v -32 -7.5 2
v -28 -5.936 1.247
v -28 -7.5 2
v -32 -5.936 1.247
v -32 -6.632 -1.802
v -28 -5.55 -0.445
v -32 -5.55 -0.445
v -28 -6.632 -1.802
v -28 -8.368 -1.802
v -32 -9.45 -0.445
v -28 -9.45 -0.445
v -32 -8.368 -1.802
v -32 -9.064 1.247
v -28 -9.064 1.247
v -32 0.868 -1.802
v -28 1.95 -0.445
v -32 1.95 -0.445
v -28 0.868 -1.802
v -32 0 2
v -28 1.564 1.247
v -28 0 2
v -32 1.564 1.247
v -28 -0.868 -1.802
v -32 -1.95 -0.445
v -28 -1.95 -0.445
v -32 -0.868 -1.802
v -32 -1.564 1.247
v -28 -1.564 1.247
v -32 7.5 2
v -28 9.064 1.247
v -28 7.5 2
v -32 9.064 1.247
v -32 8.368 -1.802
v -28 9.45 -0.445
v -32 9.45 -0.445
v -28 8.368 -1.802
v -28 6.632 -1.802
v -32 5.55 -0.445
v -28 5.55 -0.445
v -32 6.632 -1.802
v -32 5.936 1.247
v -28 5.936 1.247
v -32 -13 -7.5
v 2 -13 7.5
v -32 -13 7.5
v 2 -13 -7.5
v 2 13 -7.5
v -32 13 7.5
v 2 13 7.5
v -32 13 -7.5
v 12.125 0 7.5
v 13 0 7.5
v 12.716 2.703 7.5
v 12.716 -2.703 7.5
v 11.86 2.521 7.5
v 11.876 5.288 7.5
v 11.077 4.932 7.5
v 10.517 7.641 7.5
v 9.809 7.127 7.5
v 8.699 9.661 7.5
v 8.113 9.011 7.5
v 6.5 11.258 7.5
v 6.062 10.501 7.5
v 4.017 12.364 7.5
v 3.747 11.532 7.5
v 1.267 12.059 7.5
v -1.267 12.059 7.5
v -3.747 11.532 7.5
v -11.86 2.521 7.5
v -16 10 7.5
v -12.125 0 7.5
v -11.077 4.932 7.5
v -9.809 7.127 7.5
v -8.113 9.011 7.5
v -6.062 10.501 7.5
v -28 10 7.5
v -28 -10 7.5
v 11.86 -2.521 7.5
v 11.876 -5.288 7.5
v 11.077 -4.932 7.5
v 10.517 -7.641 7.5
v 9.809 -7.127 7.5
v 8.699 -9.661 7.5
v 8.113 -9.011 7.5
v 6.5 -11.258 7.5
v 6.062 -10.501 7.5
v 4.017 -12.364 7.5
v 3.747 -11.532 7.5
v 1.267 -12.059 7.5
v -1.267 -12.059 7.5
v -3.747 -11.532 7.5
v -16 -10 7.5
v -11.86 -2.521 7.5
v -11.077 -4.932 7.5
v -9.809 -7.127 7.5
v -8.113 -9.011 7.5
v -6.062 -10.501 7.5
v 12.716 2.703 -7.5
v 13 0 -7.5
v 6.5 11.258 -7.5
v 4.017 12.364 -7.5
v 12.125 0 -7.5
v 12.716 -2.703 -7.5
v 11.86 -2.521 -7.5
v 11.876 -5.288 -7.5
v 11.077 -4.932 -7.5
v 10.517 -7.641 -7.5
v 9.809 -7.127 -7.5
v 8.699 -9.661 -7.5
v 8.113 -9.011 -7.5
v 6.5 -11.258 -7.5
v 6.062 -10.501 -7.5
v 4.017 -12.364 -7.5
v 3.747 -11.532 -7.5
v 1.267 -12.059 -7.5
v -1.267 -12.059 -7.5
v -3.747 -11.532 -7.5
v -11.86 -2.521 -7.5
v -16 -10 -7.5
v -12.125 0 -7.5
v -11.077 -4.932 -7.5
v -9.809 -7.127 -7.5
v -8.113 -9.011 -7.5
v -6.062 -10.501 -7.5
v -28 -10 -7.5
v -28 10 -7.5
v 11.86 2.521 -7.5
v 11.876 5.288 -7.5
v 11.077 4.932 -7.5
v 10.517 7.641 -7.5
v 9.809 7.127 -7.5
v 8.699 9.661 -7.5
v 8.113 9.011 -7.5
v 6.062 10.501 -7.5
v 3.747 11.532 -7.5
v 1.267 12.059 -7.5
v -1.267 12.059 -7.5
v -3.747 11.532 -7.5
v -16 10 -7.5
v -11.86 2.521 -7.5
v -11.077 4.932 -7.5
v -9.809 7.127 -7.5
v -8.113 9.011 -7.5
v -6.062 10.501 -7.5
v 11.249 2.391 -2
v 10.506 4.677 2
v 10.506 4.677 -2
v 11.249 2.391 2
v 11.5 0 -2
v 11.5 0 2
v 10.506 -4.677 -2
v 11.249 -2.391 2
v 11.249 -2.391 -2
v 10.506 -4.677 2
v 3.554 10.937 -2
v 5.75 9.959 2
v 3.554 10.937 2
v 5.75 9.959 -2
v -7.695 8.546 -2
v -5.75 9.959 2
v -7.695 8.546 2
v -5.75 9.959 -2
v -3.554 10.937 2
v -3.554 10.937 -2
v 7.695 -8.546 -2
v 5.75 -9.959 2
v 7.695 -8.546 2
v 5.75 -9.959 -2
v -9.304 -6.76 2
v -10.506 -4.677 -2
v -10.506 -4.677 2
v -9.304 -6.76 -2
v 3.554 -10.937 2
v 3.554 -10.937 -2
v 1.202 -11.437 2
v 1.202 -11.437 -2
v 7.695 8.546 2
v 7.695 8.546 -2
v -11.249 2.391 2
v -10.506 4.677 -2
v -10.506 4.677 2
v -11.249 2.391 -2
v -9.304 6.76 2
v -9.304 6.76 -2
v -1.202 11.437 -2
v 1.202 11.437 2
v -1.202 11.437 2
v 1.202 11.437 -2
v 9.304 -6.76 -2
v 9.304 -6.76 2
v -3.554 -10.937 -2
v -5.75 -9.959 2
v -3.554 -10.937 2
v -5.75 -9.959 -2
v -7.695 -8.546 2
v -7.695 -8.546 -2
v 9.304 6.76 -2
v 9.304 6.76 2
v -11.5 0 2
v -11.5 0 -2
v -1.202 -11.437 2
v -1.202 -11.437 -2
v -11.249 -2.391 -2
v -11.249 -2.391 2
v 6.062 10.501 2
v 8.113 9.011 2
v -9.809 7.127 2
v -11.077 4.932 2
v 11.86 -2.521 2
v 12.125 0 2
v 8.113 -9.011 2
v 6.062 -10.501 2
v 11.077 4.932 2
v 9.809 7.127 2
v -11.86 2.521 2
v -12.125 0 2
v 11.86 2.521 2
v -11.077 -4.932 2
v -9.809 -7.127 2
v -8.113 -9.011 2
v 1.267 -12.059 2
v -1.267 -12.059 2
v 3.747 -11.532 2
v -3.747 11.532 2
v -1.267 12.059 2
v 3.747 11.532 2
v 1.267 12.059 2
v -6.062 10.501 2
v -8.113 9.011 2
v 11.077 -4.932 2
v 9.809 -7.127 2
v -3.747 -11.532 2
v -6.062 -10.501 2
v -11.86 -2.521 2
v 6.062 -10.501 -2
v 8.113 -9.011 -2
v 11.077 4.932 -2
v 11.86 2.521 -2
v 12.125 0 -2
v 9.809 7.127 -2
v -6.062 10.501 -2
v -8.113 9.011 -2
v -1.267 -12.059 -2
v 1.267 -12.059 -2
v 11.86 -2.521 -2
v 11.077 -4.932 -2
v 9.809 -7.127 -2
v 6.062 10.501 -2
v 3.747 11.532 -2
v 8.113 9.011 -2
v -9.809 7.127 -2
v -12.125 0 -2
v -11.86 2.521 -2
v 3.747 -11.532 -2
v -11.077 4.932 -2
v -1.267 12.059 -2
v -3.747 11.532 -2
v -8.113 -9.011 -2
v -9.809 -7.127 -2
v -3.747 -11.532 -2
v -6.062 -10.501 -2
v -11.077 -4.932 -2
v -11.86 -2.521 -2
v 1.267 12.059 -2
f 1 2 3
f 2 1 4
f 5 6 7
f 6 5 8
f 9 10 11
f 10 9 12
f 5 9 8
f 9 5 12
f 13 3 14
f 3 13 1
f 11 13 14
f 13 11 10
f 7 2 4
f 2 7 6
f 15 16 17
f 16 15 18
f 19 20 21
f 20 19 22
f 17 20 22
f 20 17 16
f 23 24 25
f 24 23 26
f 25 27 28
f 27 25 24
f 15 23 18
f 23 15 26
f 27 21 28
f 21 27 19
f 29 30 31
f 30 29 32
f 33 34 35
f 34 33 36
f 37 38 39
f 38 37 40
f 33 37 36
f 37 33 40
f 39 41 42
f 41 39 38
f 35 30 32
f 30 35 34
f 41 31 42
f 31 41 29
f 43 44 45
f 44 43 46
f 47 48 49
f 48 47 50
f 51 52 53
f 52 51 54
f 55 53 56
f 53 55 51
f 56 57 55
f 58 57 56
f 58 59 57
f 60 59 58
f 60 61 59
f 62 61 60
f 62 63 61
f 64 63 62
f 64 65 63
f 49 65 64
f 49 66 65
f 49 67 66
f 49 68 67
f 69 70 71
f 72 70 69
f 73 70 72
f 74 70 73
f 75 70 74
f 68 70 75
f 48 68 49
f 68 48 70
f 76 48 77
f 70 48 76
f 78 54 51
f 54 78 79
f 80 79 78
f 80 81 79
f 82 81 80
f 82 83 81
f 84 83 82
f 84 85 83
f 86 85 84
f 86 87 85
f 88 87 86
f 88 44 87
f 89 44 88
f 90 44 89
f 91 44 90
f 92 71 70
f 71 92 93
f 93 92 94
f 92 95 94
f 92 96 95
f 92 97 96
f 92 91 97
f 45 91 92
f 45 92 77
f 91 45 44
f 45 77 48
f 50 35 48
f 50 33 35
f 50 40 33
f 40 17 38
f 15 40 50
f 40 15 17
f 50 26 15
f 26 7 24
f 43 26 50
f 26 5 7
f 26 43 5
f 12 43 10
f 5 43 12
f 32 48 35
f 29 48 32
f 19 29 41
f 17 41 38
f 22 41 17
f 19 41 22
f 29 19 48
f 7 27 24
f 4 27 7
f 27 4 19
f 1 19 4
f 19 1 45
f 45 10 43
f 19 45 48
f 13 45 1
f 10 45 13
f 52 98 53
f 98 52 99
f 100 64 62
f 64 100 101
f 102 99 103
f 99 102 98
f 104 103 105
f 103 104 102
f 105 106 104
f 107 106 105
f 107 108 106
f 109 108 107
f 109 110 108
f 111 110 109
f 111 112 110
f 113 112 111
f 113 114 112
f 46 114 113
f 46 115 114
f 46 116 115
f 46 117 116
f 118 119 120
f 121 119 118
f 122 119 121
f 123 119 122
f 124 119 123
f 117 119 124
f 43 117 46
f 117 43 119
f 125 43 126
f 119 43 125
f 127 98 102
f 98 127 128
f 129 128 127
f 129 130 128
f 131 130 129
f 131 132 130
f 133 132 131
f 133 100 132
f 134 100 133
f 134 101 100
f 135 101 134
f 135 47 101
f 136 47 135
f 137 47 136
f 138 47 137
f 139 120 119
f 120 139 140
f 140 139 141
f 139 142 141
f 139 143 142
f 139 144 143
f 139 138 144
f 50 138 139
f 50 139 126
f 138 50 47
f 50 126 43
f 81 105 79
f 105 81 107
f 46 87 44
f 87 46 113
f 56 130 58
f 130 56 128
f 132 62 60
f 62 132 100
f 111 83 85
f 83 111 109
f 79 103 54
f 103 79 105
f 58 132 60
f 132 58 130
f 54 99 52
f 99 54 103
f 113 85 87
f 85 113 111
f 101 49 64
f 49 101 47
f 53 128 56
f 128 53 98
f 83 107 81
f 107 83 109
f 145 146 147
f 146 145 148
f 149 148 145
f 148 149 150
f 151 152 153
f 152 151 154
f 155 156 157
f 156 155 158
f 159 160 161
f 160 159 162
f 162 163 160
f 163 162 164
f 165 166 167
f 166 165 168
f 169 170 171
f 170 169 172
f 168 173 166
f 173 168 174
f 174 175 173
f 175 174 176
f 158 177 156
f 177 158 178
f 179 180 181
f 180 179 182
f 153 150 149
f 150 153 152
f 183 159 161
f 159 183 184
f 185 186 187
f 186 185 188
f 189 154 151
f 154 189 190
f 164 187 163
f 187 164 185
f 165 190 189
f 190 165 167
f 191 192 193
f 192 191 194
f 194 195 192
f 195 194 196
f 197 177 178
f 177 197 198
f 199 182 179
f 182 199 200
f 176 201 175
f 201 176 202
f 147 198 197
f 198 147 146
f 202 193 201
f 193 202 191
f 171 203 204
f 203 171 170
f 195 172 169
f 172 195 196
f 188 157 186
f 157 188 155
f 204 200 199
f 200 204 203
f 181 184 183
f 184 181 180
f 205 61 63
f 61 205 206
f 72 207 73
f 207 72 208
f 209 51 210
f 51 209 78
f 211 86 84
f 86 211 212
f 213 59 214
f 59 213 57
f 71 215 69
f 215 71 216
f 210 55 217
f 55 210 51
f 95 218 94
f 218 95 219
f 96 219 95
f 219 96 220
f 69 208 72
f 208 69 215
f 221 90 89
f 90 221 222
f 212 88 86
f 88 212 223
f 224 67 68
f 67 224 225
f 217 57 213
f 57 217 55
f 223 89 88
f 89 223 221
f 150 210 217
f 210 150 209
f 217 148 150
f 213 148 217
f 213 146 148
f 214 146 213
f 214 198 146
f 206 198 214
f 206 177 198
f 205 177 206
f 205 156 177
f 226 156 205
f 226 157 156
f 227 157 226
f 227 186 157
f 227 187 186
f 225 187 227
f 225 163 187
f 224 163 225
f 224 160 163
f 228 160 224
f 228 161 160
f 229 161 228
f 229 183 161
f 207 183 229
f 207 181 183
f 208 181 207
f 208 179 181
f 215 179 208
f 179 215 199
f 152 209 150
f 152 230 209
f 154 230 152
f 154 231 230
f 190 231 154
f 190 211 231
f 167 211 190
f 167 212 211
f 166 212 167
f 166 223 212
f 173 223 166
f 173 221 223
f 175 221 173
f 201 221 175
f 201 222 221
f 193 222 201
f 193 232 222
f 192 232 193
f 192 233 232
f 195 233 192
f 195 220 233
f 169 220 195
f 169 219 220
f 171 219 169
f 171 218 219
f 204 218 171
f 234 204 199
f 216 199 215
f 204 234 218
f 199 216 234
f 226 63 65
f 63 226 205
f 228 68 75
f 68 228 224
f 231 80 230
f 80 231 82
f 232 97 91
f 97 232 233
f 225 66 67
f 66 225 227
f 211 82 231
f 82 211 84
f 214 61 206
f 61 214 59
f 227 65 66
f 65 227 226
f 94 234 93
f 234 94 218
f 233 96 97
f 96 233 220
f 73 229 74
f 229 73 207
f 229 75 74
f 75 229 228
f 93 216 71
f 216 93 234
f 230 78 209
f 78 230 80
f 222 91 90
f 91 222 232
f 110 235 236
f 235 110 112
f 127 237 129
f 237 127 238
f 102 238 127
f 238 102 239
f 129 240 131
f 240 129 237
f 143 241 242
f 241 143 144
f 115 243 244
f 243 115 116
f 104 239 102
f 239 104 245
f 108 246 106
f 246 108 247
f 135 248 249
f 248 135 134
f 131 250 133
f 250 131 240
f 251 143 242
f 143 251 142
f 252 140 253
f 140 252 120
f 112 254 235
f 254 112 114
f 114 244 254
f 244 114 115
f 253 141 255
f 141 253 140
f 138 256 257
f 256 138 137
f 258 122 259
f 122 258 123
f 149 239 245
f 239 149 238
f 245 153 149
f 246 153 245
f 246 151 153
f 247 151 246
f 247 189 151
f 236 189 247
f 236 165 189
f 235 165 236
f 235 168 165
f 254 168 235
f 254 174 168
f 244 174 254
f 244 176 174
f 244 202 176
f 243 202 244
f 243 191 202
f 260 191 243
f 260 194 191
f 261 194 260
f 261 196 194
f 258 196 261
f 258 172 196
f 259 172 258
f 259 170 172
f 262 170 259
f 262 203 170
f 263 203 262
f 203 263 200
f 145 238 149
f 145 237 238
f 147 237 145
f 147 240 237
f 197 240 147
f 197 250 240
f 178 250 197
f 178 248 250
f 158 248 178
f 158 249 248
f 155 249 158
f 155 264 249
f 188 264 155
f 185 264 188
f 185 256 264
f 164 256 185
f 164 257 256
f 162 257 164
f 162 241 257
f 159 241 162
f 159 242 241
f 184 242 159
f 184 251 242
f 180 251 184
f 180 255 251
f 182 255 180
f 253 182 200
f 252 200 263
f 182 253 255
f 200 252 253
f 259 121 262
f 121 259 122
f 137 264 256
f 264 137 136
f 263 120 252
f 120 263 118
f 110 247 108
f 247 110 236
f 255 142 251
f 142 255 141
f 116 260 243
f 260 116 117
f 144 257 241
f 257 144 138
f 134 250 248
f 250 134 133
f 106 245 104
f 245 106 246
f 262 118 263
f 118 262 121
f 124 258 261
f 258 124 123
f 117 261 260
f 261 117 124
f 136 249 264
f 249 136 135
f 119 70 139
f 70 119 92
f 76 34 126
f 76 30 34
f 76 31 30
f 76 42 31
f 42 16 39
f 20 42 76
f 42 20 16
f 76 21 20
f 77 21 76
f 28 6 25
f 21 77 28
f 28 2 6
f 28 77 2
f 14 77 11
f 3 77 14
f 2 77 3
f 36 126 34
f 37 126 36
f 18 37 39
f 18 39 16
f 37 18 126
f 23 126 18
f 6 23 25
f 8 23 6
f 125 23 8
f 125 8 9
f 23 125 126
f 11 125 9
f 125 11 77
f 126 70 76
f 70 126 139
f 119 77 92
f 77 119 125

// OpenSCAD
difference() {
    hull() {
        cylinder(d=26,h=15,center=true);
        translate([-15,0,0]) cube([34,26,15],center=true);
    }
    cylinder(d=23,h=15,center=true);
    translate([0,0,5]) cylinder(h=6,d=24.25,center=true);
    translate([0,0,-5]) cylinder(h=6,d=24.25,center=true);
    translate([-22,0,0]) cube([12,20,15], center=true);
    for (y=[-7.5,0,7.5]) 
        translate([-20,y,0]) #rotate([0,-90,0]) cylinder(d=4,h=20);
}
